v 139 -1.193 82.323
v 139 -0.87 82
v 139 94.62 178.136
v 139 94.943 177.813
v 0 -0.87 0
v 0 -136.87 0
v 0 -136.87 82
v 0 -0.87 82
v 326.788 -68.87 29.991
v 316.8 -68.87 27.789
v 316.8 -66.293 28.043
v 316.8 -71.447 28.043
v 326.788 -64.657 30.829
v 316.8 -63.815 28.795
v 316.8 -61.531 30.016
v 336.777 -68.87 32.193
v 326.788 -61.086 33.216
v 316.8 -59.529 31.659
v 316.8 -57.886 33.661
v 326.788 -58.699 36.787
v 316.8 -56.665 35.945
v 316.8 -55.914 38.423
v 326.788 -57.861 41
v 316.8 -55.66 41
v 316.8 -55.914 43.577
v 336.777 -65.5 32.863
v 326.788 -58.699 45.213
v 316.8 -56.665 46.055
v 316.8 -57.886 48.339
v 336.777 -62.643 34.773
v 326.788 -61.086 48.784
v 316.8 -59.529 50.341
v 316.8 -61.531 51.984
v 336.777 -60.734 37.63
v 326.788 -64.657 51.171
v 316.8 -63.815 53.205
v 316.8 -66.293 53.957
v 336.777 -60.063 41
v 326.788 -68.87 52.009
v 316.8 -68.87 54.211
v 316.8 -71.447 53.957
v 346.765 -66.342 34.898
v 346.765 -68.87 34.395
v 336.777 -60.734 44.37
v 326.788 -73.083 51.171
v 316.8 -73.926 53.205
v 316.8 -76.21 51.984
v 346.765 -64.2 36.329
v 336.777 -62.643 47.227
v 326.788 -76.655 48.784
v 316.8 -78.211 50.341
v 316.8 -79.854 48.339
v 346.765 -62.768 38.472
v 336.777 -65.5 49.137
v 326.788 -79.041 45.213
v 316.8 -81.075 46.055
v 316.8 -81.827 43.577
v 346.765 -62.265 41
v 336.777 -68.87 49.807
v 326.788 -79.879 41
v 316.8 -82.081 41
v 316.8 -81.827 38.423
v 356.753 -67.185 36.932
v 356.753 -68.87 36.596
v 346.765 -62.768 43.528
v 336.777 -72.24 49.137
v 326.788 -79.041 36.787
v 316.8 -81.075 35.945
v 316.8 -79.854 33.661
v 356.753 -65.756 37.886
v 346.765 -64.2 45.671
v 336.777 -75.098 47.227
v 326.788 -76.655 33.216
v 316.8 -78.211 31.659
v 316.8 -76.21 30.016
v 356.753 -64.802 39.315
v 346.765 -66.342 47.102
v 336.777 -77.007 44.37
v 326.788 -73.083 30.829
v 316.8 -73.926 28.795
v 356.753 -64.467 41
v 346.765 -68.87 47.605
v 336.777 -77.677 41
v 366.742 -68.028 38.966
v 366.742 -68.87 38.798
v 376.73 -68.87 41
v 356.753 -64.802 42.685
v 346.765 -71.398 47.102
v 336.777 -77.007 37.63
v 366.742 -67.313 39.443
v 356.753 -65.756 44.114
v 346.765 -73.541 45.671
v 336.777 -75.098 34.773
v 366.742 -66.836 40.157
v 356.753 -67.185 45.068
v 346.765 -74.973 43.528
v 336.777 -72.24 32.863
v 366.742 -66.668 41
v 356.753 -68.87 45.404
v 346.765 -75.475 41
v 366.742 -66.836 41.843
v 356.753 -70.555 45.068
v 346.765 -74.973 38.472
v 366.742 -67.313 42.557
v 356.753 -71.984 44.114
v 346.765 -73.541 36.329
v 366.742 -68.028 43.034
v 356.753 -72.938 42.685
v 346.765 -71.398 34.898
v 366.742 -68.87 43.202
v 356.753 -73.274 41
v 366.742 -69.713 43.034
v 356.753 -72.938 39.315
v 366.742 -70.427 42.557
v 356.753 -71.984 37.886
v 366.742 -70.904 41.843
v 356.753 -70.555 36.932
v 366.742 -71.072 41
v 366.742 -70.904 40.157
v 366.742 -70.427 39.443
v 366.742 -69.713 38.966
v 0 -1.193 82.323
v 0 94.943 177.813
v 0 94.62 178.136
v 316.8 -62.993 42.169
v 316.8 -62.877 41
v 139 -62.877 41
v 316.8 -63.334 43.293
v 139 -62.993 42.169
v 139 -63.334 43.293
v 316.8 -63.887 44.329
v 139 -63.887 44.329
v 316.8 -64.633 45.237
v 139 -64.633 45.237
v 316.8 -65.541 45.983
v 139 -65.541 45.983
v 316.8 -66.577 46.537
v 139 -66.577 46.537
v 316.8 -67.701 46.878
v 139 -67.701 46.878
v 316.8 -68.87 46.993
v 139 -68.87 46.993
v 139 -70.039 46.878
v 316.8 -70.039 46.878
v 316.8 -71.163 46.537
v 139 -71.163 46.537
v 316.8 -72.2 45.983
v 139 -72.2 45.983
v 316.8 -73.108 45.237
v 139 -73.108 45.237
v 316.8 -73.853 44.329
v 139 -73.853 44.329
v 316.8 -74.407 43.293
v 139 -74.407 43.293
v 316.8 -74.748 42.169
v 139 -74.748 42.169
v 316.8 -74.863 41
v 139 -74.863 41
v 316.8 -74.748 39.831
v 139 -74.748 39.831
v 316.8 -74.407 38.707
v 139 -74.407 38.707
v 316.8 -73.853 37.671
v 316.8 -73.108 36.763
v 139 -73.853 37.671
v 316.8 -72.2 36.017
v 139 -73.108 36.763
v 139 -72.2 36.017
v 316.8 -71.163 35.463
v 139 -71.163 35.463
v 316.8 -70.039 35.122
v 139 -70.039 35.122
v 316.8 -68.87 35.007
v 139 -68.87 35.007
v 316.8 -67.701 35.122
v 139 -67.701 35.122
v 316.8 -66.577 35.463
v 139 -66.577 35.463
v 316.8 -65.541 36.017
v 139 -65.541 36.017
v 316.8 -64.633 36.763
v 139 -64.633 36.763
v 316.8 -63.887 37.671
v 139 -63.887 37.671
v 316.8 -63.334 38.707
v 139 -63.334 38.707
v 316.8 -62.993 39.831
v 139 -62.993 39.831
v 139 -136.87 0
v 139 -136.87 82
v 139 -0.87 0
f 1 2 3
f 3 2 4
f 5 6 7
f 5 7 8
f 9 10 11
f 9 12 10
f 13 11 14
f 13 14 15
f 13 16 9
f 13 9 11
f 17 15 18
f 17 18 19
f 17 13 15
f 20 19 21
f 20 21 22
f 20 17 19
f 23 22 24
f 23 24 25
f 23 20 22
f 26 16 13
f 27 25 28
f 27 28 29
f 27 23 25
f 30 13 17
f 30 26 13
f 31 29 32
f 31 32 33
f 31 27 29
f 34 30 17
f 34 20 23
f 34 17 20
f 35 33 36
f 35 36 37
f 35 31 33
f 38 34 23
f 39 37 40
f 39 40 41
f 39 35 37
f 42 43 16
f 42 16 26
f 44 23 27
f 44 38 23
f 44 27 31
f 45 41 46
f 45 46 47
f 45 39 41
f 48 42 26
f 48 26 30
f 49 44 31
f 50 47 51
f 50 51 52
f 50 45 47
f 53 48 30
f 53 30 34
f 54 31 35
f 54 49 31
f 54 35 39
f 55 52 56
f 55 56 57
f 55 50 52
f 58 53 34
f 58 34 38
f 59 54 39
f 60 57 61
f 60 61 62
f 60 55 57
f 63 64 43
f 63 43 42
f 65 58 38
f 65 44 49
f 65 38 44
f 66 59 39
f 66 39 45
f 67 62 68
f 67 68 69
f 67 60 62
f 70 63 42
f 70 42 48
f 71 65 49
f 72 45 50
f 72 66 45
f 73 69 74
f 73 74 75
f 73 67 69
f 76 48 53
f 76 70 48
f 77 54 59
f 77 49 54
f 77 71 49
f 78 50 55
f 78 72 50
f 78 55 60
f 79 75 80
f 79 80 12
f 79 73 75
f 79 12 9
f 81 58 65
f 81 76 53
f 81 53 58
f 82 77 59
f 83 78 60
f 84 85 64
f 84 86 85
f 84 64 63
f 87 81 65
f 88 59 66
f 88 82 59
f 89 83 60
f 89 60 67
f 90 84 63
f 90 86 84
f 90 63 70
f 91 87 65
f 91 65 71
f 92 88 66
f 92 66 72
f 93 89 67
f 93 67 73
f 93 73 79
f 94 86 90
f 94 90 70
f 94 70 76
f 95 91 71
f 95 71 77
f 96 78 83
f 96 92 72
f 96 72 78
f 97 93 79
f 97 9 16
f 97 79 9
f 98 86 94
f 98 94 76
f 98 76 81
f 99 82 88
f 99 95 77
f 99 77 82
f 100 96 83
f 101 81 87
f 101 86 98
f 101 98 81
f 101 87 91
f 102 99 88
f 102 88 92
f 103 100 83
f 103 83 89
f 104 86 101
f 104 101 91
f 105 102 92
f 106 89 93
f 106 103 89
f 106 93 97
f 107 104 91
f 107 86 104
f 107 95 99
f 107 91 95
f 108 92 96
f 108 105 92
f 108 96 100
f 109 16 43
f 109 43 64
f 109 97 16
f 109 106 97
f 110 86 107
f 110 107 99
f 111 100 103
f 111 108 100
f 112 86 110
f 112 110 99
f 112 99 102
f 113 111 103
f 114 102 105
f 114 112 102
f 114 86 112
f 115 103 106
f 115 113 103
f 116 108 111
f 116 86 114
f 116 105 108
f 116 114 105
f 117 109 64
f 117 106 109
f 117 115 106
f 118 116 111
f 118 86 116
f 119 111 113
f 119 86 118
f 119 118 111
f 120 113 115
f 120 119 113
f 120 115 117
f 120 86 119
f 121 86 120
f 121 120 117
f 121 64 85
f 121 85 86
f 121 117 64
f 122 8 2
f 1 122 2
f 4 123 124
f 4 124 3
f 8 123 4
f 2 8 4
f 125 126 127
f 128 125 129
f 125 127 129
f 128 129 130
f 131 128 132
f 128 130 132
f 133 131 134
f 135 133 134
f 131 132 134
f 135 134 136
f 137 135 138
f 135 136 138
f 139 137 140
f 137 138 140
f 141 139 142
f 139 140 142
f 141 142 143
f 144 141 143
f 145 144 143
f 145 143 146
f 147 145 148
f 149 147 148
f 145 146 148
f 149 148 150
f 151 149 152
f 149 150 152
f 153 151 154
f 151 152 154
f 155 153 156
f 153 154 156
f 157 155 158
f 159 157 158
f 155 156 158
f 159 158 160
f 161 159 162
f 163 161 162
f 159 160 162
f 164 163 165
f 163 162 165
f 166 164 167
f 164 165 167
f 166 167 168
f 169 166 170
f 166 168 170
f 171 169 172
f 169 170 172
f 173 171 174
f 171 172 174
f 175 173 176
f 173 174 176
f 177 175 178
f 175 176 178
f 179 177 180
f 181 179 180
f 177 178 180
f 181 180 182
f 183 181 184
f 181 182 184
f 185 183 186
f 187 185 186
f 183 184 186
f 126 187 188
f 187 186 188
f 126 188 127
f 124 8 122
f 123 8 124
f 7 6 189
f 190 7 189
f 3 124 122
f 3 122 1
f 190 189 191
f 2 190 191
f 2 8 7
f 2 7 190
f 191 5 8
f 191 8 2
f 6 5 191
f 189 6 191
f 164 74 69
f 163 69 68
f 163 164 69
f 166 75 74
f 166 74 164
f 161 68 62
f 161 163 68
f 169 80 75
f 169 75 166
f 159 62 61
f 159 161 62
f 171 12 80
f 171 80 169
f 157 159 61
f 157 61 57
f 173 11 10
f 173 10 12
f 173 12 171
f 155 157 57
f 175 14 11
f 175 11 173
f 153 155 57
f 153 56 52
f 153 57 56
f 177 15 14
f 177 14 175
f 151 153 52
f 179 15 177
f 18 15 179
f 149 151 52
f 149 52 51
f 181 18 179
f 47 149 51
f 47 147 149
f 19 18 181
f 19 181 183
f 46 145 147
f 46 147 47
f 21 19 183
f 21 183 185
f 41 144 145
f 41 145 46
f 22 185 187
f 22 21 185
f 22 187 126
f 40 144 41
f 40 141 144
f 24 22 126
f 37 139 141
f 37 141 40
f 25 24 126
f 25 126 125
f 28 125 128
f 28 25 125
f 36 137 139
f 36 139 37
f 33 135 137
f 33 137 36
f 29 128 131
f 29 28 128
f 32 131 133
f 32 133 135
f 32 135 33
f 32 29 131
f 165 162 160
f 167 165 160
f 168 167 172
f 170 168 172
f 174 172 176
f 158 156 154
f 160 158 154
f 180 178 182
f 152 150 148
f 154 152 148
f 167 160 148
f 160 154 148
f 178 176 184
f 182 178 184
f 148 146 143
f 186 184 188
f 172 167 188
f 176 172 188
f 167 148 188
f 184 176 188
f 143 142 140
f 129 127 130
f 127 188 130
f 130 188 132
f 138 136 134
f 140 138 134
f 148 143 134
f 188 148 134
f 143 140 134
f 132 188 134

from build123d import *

# Parameters (mm, degrees)
F0_W     = 139
F0_H     = 136
F1_DEPTH = 82
F3_W     = 139
F3_H     = 135.5
F4_DEPTH = 0.4572
F5_R     = 5.992711
F6_DEPTH = 177.8


with BuildPart() as f1:
    # F0 (on Top) → F1 (new body)
    with BuildSketch(Plane.XY):
        with Locations((69.5, -68.870176)):
            Rectangle(F0_W, F0_H)
    extrude(amount=F1_DEPTH)


with BuildPart() as f4:
    # F3 (on face) → F4 (new body)
    with BuildSketch(Plane(origin=(0, -41.435088, 41.435088), x_dir=(1, 0, 0), z_dir=(0, -0.707107, 0.707107))):
        with Locations((69.5, 125.117448)):
            Rectangle(F3_W, F3_H)
    extrude(amount=F4_DEPTH)


with BuildPart() as f6:
    # F5 (on face) → F6 (new body)
    with BuildSketch(Plane.YZ.offset(139)):
        with Locations((-68.870176, 41)):
            Circle(F5_R)
    extrude(amount=F6_DEPTH)

    # F8 (on face) → F9 (revolve)
    with BuildSketch(Plane.XZ.offset(68.870176)):
        Polygon((376.72985, 41), (316.8, 41), (316.8, 27.789498), align=None)
    revolve(axis=Axis((227.9, -68.870176, 41), (1, 0, 0)))


solid = Compound([f1.part, f4.part, f6.part])
